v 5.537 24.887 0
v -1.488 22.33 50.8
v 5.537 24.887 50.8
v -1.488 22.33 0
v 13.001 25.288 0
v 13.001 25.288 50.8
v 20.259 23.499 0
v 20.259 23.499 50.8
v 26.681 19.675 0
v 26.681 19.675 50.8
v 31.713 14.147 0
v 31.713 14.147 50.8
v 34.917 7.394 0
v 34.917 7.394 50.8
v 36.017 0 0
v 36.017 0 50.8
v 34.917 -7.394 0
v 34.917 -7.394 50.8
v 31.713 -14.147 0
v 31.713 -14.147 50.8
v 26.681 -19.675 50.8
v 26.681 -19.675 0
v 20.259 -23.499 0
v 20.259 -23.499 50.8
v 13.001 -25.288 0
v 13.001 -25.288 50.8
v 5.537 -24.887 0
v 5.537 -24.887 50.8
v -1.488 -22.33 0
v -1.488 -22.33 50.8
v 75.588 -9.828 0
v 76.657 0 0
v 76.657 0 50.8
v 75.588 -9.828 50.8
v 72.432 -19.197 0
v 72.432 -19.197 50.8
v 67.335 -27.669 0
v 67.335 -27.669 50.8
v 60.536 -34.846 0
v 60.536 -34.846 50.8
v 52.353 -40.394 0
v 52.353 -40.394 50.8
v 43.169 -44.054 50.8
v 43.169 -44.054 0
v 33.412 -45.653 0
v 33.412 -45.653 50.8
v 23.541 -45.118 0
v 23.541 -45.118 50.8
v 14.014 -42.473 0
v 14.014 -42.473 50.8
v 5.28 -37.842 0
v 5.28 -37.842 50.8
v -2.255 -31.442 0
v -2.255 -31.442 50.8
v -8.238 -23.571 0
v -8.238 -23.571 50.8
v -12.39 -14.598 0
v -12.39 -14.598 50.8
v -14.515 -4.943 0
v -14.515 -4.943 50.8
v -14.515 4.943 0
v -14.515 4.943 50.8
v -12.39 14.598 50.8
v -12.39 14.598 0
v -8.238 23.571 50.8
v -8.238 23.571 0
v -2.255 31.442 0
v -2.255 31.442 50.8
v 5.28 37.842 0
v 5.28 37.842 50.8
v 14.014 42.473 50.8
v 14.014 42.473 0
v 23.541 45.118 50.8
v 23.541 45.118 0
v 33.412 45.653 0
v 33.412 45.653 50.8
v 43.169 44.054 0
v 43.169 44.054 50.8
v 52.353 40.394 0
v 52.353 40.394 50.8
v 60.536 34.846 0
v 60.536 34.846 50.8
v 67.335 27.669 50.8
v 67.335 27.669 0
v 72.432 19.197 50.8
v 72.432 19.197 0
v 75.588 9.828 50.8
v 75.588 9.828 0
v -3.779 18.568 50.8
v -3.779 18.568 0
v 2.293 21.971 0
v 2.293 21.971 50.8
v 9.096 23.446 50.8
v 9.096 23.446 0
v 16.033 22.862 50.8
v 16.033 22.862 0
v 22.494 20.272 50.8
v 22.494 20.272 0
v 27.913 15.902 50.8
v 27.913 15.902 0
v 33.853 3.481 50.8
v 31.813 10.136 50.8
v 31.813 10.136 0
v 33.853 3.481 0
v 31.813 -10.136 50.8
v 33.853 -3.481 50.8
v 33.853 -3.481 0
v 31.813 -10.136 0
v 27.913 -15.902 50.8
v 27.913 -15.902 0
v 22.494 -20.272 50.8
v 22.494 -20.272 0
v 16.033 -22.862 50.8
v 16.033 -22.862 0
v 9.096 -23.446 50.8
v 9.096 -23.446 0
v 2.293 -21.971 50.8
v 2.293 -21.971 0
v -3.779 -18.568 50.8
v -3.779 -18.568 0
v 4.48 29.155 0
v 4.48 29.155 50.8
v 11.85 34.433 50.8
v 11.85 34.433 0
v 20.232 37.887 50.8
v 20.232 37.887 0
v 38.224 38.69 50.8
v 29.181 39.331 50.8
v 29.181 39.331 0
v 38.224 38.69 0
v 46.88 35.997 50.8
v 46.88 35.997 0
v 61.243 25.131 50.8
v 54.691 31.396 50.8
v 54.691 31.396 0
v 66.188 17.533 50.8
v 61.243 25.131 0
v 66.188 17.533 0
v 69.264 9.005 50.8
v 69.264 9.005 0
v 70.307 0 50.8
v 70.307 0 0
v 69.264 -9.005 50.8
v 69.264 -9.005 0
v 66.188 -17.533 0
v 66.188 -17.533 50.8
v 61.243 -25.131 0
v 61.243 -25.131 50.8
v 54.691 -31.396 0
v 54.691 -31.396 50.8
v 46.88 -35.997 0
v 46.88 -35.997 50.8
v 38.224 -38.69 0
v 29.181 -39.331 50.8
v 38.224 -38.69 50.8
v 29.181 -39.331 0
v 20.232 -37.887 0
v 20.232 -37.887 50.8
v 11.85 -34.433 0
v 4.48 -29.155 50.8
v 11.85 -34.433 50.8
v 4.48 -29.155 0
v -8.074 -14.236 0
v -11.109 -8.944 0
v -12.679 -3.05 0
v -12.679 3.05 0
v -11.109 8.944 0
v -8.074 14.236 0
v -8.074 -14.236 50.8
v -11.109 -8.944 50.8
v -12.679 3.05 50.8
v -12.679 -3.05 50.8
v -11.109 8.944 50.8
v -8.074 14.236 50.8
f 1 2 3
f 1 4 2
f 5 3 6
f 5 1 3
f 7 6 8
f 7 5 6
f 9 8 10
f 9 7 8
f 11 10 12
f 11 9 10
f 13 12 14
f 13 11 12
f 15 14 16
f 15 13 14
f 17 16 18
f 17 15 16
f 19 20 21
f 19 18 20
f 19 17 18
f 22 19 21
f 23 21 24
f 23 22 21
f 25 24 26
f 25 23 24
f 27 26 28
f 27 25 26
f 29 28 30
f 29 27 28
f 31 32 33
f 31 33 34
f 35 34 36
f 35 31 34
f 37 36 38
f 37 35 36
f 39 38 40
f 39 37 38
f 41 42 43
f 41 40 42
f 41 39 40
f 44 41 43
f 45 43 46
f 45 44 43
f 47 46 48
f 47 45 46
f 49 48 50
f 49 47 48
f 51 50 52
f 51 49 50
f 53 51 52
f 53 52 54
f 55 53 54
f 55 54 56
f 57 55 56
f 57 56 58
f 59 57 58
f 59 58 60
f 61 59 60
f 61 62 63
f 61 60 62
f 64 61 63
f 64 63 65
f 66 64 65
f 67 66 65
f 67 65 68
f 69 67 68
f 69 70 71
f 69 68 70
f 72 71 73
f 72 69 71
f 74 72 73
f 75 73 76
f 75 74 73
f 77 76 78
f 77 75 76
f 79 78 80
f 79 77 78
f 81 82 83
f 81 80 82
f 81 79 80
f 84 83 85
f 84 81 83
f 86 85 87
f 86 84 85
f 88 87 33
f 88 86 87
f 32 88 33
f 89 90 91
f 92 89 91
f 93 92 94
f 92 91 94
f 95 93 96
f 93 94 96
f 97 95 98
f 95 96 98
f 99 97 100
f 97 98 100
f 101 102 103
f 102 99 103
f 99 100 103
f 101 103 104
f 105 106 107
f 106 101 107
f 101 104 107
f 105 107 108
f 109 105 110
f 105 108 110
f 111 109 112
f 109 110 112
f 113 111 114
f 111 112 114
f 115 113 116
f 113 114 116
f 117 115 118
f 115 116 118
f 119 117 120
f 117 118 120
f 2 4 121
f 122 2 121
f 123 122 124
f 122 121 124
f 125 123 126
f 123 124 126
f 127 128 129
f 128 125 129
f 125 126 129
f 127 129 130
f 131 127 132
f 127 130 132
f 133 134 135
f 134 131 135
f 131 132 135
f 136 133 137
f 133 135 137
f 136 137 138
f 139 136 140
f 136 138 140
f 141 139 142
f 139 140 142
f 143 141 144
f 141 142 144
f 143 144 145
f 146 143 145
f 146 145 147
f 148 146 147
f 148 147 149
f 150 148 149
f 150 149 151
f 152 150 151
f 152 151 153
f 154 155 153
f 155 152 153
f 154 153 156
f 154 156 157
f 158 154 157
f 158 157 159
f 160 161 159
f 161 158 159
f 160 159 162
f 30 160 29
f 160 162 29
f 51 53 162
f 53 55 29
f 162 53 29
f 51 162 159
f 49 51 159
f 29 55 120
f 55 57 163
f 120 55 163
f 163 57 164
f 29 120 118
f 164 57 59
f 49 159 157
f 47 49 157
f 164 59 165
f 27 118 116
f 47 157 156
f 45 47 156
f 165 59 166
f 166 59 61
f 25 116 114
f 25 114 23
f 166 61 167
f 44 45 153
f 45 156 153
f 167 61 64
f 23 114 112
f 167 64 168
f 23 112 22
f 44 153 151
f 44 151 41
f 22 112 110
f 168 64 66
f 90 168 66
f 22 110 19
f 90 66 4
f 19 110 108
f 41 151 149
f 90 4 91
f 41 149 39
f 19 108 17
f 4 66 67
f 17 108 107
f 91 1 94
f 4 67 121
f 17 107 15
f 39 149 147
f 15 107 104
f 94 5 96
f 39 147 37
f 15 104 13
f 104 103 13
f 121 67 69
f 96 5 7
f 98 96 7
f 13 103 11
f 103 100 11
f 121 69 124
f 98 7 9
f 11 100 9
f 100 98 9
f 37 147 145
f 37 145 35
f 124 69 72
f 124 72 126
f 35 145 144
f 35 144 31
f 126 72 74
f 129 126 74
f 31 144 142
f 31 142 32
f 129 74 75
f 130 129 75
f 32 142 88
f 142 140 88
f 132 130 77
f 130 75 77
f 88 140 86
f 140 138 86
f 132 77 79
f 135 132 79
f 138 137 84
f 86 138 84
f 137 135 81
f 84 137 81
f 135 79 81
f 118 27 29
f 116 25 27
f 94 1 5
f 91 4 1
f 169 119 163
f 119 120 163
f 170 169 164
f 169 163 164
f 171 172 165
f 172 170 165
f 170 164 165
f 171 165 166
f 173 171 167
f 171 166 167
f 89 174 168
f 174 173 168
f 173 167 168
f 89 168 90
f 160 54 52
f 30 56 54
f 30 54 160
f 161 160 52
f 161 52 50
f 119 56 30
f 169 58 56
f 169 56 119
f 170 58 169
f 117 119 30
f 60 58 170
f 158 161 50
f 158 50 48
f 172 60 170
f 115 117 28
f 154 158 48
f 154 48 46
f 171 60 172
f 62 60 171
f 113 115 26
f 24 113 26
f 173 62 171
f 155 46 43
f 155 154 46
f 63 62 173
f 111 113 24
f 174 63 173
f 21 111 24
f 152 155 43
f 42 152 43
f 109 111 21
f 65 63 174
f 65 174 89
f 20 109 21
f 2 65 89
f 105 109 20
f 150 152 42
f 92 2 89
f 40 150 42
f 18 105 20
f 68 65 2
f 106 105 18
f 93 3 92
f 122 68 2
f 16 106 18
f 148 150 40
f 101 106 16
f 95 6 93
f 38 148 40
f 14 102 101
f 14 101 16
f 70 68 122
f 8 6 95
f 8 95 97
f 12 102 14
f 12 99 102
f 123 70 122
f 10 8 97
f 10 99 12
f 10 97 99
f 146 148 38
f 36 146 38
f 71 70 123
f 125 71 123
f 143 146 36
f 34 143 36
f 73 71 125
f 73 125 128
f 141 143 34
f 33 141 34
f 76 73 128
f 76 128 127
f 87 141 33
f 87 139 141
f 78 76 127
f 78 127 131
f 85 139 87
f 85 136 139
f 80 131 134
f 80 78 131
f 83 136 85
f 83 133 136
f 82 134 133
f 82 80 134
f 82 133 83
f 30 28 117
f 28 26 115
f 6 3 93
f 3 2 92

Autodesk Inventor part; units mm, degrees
ref_plane "YZ Plane" through (0, 0, 0) normal (1, 0, 0) x (0, 1, 0)
ref_plane "XZ Plane" through (0, 0, 0) normal (0, 1, 0) x (-1, 0, 0)
ref_plane "XY Plane" through (0, 0, 0) normal (0, 0, 1) x (1, 0, 0)
sketch "Sketch1" plane through (0, 0, 0) normal (0, 0, 1) x (1, 0, 0)
  line L0 (-6.35, 0) -> (-14.7828, 0) construction
  line L1 (0, 0) -> (30.9372, 0) construction
  circle A0 centre (30.9372, 0) radius 45.72
  line L2 (-14.7828, 0) -> (10.6172, 0) construction
  arc A1 (-1.4875, -22.3302) -> (-1.4875, 22.3302) centre (10.6172, 0) ccw
  arc A2 (-3.7794, -18.5675) -> (-3.7794, 18.5675) centre (10.6172, 0) ccw
  arc A3 (-1.4875, -22.3302) -> (-1.4875, 22.3302) centre (30.9372, 0) ccw
  arc A4 (-3.7794, 18.5675) -> (-3.7794, -18.5675) centre (10.6172, 0) ccw
  dimension "d1" = 8.4328
  dimension "d2" = 30.9372
  dimension "d6" = 25.4
  dimension "d7" = 46.99
extrude "Extrusion1" add sketch "Sketch1" along normal blind 50.8
properties part number "RO mark final"
